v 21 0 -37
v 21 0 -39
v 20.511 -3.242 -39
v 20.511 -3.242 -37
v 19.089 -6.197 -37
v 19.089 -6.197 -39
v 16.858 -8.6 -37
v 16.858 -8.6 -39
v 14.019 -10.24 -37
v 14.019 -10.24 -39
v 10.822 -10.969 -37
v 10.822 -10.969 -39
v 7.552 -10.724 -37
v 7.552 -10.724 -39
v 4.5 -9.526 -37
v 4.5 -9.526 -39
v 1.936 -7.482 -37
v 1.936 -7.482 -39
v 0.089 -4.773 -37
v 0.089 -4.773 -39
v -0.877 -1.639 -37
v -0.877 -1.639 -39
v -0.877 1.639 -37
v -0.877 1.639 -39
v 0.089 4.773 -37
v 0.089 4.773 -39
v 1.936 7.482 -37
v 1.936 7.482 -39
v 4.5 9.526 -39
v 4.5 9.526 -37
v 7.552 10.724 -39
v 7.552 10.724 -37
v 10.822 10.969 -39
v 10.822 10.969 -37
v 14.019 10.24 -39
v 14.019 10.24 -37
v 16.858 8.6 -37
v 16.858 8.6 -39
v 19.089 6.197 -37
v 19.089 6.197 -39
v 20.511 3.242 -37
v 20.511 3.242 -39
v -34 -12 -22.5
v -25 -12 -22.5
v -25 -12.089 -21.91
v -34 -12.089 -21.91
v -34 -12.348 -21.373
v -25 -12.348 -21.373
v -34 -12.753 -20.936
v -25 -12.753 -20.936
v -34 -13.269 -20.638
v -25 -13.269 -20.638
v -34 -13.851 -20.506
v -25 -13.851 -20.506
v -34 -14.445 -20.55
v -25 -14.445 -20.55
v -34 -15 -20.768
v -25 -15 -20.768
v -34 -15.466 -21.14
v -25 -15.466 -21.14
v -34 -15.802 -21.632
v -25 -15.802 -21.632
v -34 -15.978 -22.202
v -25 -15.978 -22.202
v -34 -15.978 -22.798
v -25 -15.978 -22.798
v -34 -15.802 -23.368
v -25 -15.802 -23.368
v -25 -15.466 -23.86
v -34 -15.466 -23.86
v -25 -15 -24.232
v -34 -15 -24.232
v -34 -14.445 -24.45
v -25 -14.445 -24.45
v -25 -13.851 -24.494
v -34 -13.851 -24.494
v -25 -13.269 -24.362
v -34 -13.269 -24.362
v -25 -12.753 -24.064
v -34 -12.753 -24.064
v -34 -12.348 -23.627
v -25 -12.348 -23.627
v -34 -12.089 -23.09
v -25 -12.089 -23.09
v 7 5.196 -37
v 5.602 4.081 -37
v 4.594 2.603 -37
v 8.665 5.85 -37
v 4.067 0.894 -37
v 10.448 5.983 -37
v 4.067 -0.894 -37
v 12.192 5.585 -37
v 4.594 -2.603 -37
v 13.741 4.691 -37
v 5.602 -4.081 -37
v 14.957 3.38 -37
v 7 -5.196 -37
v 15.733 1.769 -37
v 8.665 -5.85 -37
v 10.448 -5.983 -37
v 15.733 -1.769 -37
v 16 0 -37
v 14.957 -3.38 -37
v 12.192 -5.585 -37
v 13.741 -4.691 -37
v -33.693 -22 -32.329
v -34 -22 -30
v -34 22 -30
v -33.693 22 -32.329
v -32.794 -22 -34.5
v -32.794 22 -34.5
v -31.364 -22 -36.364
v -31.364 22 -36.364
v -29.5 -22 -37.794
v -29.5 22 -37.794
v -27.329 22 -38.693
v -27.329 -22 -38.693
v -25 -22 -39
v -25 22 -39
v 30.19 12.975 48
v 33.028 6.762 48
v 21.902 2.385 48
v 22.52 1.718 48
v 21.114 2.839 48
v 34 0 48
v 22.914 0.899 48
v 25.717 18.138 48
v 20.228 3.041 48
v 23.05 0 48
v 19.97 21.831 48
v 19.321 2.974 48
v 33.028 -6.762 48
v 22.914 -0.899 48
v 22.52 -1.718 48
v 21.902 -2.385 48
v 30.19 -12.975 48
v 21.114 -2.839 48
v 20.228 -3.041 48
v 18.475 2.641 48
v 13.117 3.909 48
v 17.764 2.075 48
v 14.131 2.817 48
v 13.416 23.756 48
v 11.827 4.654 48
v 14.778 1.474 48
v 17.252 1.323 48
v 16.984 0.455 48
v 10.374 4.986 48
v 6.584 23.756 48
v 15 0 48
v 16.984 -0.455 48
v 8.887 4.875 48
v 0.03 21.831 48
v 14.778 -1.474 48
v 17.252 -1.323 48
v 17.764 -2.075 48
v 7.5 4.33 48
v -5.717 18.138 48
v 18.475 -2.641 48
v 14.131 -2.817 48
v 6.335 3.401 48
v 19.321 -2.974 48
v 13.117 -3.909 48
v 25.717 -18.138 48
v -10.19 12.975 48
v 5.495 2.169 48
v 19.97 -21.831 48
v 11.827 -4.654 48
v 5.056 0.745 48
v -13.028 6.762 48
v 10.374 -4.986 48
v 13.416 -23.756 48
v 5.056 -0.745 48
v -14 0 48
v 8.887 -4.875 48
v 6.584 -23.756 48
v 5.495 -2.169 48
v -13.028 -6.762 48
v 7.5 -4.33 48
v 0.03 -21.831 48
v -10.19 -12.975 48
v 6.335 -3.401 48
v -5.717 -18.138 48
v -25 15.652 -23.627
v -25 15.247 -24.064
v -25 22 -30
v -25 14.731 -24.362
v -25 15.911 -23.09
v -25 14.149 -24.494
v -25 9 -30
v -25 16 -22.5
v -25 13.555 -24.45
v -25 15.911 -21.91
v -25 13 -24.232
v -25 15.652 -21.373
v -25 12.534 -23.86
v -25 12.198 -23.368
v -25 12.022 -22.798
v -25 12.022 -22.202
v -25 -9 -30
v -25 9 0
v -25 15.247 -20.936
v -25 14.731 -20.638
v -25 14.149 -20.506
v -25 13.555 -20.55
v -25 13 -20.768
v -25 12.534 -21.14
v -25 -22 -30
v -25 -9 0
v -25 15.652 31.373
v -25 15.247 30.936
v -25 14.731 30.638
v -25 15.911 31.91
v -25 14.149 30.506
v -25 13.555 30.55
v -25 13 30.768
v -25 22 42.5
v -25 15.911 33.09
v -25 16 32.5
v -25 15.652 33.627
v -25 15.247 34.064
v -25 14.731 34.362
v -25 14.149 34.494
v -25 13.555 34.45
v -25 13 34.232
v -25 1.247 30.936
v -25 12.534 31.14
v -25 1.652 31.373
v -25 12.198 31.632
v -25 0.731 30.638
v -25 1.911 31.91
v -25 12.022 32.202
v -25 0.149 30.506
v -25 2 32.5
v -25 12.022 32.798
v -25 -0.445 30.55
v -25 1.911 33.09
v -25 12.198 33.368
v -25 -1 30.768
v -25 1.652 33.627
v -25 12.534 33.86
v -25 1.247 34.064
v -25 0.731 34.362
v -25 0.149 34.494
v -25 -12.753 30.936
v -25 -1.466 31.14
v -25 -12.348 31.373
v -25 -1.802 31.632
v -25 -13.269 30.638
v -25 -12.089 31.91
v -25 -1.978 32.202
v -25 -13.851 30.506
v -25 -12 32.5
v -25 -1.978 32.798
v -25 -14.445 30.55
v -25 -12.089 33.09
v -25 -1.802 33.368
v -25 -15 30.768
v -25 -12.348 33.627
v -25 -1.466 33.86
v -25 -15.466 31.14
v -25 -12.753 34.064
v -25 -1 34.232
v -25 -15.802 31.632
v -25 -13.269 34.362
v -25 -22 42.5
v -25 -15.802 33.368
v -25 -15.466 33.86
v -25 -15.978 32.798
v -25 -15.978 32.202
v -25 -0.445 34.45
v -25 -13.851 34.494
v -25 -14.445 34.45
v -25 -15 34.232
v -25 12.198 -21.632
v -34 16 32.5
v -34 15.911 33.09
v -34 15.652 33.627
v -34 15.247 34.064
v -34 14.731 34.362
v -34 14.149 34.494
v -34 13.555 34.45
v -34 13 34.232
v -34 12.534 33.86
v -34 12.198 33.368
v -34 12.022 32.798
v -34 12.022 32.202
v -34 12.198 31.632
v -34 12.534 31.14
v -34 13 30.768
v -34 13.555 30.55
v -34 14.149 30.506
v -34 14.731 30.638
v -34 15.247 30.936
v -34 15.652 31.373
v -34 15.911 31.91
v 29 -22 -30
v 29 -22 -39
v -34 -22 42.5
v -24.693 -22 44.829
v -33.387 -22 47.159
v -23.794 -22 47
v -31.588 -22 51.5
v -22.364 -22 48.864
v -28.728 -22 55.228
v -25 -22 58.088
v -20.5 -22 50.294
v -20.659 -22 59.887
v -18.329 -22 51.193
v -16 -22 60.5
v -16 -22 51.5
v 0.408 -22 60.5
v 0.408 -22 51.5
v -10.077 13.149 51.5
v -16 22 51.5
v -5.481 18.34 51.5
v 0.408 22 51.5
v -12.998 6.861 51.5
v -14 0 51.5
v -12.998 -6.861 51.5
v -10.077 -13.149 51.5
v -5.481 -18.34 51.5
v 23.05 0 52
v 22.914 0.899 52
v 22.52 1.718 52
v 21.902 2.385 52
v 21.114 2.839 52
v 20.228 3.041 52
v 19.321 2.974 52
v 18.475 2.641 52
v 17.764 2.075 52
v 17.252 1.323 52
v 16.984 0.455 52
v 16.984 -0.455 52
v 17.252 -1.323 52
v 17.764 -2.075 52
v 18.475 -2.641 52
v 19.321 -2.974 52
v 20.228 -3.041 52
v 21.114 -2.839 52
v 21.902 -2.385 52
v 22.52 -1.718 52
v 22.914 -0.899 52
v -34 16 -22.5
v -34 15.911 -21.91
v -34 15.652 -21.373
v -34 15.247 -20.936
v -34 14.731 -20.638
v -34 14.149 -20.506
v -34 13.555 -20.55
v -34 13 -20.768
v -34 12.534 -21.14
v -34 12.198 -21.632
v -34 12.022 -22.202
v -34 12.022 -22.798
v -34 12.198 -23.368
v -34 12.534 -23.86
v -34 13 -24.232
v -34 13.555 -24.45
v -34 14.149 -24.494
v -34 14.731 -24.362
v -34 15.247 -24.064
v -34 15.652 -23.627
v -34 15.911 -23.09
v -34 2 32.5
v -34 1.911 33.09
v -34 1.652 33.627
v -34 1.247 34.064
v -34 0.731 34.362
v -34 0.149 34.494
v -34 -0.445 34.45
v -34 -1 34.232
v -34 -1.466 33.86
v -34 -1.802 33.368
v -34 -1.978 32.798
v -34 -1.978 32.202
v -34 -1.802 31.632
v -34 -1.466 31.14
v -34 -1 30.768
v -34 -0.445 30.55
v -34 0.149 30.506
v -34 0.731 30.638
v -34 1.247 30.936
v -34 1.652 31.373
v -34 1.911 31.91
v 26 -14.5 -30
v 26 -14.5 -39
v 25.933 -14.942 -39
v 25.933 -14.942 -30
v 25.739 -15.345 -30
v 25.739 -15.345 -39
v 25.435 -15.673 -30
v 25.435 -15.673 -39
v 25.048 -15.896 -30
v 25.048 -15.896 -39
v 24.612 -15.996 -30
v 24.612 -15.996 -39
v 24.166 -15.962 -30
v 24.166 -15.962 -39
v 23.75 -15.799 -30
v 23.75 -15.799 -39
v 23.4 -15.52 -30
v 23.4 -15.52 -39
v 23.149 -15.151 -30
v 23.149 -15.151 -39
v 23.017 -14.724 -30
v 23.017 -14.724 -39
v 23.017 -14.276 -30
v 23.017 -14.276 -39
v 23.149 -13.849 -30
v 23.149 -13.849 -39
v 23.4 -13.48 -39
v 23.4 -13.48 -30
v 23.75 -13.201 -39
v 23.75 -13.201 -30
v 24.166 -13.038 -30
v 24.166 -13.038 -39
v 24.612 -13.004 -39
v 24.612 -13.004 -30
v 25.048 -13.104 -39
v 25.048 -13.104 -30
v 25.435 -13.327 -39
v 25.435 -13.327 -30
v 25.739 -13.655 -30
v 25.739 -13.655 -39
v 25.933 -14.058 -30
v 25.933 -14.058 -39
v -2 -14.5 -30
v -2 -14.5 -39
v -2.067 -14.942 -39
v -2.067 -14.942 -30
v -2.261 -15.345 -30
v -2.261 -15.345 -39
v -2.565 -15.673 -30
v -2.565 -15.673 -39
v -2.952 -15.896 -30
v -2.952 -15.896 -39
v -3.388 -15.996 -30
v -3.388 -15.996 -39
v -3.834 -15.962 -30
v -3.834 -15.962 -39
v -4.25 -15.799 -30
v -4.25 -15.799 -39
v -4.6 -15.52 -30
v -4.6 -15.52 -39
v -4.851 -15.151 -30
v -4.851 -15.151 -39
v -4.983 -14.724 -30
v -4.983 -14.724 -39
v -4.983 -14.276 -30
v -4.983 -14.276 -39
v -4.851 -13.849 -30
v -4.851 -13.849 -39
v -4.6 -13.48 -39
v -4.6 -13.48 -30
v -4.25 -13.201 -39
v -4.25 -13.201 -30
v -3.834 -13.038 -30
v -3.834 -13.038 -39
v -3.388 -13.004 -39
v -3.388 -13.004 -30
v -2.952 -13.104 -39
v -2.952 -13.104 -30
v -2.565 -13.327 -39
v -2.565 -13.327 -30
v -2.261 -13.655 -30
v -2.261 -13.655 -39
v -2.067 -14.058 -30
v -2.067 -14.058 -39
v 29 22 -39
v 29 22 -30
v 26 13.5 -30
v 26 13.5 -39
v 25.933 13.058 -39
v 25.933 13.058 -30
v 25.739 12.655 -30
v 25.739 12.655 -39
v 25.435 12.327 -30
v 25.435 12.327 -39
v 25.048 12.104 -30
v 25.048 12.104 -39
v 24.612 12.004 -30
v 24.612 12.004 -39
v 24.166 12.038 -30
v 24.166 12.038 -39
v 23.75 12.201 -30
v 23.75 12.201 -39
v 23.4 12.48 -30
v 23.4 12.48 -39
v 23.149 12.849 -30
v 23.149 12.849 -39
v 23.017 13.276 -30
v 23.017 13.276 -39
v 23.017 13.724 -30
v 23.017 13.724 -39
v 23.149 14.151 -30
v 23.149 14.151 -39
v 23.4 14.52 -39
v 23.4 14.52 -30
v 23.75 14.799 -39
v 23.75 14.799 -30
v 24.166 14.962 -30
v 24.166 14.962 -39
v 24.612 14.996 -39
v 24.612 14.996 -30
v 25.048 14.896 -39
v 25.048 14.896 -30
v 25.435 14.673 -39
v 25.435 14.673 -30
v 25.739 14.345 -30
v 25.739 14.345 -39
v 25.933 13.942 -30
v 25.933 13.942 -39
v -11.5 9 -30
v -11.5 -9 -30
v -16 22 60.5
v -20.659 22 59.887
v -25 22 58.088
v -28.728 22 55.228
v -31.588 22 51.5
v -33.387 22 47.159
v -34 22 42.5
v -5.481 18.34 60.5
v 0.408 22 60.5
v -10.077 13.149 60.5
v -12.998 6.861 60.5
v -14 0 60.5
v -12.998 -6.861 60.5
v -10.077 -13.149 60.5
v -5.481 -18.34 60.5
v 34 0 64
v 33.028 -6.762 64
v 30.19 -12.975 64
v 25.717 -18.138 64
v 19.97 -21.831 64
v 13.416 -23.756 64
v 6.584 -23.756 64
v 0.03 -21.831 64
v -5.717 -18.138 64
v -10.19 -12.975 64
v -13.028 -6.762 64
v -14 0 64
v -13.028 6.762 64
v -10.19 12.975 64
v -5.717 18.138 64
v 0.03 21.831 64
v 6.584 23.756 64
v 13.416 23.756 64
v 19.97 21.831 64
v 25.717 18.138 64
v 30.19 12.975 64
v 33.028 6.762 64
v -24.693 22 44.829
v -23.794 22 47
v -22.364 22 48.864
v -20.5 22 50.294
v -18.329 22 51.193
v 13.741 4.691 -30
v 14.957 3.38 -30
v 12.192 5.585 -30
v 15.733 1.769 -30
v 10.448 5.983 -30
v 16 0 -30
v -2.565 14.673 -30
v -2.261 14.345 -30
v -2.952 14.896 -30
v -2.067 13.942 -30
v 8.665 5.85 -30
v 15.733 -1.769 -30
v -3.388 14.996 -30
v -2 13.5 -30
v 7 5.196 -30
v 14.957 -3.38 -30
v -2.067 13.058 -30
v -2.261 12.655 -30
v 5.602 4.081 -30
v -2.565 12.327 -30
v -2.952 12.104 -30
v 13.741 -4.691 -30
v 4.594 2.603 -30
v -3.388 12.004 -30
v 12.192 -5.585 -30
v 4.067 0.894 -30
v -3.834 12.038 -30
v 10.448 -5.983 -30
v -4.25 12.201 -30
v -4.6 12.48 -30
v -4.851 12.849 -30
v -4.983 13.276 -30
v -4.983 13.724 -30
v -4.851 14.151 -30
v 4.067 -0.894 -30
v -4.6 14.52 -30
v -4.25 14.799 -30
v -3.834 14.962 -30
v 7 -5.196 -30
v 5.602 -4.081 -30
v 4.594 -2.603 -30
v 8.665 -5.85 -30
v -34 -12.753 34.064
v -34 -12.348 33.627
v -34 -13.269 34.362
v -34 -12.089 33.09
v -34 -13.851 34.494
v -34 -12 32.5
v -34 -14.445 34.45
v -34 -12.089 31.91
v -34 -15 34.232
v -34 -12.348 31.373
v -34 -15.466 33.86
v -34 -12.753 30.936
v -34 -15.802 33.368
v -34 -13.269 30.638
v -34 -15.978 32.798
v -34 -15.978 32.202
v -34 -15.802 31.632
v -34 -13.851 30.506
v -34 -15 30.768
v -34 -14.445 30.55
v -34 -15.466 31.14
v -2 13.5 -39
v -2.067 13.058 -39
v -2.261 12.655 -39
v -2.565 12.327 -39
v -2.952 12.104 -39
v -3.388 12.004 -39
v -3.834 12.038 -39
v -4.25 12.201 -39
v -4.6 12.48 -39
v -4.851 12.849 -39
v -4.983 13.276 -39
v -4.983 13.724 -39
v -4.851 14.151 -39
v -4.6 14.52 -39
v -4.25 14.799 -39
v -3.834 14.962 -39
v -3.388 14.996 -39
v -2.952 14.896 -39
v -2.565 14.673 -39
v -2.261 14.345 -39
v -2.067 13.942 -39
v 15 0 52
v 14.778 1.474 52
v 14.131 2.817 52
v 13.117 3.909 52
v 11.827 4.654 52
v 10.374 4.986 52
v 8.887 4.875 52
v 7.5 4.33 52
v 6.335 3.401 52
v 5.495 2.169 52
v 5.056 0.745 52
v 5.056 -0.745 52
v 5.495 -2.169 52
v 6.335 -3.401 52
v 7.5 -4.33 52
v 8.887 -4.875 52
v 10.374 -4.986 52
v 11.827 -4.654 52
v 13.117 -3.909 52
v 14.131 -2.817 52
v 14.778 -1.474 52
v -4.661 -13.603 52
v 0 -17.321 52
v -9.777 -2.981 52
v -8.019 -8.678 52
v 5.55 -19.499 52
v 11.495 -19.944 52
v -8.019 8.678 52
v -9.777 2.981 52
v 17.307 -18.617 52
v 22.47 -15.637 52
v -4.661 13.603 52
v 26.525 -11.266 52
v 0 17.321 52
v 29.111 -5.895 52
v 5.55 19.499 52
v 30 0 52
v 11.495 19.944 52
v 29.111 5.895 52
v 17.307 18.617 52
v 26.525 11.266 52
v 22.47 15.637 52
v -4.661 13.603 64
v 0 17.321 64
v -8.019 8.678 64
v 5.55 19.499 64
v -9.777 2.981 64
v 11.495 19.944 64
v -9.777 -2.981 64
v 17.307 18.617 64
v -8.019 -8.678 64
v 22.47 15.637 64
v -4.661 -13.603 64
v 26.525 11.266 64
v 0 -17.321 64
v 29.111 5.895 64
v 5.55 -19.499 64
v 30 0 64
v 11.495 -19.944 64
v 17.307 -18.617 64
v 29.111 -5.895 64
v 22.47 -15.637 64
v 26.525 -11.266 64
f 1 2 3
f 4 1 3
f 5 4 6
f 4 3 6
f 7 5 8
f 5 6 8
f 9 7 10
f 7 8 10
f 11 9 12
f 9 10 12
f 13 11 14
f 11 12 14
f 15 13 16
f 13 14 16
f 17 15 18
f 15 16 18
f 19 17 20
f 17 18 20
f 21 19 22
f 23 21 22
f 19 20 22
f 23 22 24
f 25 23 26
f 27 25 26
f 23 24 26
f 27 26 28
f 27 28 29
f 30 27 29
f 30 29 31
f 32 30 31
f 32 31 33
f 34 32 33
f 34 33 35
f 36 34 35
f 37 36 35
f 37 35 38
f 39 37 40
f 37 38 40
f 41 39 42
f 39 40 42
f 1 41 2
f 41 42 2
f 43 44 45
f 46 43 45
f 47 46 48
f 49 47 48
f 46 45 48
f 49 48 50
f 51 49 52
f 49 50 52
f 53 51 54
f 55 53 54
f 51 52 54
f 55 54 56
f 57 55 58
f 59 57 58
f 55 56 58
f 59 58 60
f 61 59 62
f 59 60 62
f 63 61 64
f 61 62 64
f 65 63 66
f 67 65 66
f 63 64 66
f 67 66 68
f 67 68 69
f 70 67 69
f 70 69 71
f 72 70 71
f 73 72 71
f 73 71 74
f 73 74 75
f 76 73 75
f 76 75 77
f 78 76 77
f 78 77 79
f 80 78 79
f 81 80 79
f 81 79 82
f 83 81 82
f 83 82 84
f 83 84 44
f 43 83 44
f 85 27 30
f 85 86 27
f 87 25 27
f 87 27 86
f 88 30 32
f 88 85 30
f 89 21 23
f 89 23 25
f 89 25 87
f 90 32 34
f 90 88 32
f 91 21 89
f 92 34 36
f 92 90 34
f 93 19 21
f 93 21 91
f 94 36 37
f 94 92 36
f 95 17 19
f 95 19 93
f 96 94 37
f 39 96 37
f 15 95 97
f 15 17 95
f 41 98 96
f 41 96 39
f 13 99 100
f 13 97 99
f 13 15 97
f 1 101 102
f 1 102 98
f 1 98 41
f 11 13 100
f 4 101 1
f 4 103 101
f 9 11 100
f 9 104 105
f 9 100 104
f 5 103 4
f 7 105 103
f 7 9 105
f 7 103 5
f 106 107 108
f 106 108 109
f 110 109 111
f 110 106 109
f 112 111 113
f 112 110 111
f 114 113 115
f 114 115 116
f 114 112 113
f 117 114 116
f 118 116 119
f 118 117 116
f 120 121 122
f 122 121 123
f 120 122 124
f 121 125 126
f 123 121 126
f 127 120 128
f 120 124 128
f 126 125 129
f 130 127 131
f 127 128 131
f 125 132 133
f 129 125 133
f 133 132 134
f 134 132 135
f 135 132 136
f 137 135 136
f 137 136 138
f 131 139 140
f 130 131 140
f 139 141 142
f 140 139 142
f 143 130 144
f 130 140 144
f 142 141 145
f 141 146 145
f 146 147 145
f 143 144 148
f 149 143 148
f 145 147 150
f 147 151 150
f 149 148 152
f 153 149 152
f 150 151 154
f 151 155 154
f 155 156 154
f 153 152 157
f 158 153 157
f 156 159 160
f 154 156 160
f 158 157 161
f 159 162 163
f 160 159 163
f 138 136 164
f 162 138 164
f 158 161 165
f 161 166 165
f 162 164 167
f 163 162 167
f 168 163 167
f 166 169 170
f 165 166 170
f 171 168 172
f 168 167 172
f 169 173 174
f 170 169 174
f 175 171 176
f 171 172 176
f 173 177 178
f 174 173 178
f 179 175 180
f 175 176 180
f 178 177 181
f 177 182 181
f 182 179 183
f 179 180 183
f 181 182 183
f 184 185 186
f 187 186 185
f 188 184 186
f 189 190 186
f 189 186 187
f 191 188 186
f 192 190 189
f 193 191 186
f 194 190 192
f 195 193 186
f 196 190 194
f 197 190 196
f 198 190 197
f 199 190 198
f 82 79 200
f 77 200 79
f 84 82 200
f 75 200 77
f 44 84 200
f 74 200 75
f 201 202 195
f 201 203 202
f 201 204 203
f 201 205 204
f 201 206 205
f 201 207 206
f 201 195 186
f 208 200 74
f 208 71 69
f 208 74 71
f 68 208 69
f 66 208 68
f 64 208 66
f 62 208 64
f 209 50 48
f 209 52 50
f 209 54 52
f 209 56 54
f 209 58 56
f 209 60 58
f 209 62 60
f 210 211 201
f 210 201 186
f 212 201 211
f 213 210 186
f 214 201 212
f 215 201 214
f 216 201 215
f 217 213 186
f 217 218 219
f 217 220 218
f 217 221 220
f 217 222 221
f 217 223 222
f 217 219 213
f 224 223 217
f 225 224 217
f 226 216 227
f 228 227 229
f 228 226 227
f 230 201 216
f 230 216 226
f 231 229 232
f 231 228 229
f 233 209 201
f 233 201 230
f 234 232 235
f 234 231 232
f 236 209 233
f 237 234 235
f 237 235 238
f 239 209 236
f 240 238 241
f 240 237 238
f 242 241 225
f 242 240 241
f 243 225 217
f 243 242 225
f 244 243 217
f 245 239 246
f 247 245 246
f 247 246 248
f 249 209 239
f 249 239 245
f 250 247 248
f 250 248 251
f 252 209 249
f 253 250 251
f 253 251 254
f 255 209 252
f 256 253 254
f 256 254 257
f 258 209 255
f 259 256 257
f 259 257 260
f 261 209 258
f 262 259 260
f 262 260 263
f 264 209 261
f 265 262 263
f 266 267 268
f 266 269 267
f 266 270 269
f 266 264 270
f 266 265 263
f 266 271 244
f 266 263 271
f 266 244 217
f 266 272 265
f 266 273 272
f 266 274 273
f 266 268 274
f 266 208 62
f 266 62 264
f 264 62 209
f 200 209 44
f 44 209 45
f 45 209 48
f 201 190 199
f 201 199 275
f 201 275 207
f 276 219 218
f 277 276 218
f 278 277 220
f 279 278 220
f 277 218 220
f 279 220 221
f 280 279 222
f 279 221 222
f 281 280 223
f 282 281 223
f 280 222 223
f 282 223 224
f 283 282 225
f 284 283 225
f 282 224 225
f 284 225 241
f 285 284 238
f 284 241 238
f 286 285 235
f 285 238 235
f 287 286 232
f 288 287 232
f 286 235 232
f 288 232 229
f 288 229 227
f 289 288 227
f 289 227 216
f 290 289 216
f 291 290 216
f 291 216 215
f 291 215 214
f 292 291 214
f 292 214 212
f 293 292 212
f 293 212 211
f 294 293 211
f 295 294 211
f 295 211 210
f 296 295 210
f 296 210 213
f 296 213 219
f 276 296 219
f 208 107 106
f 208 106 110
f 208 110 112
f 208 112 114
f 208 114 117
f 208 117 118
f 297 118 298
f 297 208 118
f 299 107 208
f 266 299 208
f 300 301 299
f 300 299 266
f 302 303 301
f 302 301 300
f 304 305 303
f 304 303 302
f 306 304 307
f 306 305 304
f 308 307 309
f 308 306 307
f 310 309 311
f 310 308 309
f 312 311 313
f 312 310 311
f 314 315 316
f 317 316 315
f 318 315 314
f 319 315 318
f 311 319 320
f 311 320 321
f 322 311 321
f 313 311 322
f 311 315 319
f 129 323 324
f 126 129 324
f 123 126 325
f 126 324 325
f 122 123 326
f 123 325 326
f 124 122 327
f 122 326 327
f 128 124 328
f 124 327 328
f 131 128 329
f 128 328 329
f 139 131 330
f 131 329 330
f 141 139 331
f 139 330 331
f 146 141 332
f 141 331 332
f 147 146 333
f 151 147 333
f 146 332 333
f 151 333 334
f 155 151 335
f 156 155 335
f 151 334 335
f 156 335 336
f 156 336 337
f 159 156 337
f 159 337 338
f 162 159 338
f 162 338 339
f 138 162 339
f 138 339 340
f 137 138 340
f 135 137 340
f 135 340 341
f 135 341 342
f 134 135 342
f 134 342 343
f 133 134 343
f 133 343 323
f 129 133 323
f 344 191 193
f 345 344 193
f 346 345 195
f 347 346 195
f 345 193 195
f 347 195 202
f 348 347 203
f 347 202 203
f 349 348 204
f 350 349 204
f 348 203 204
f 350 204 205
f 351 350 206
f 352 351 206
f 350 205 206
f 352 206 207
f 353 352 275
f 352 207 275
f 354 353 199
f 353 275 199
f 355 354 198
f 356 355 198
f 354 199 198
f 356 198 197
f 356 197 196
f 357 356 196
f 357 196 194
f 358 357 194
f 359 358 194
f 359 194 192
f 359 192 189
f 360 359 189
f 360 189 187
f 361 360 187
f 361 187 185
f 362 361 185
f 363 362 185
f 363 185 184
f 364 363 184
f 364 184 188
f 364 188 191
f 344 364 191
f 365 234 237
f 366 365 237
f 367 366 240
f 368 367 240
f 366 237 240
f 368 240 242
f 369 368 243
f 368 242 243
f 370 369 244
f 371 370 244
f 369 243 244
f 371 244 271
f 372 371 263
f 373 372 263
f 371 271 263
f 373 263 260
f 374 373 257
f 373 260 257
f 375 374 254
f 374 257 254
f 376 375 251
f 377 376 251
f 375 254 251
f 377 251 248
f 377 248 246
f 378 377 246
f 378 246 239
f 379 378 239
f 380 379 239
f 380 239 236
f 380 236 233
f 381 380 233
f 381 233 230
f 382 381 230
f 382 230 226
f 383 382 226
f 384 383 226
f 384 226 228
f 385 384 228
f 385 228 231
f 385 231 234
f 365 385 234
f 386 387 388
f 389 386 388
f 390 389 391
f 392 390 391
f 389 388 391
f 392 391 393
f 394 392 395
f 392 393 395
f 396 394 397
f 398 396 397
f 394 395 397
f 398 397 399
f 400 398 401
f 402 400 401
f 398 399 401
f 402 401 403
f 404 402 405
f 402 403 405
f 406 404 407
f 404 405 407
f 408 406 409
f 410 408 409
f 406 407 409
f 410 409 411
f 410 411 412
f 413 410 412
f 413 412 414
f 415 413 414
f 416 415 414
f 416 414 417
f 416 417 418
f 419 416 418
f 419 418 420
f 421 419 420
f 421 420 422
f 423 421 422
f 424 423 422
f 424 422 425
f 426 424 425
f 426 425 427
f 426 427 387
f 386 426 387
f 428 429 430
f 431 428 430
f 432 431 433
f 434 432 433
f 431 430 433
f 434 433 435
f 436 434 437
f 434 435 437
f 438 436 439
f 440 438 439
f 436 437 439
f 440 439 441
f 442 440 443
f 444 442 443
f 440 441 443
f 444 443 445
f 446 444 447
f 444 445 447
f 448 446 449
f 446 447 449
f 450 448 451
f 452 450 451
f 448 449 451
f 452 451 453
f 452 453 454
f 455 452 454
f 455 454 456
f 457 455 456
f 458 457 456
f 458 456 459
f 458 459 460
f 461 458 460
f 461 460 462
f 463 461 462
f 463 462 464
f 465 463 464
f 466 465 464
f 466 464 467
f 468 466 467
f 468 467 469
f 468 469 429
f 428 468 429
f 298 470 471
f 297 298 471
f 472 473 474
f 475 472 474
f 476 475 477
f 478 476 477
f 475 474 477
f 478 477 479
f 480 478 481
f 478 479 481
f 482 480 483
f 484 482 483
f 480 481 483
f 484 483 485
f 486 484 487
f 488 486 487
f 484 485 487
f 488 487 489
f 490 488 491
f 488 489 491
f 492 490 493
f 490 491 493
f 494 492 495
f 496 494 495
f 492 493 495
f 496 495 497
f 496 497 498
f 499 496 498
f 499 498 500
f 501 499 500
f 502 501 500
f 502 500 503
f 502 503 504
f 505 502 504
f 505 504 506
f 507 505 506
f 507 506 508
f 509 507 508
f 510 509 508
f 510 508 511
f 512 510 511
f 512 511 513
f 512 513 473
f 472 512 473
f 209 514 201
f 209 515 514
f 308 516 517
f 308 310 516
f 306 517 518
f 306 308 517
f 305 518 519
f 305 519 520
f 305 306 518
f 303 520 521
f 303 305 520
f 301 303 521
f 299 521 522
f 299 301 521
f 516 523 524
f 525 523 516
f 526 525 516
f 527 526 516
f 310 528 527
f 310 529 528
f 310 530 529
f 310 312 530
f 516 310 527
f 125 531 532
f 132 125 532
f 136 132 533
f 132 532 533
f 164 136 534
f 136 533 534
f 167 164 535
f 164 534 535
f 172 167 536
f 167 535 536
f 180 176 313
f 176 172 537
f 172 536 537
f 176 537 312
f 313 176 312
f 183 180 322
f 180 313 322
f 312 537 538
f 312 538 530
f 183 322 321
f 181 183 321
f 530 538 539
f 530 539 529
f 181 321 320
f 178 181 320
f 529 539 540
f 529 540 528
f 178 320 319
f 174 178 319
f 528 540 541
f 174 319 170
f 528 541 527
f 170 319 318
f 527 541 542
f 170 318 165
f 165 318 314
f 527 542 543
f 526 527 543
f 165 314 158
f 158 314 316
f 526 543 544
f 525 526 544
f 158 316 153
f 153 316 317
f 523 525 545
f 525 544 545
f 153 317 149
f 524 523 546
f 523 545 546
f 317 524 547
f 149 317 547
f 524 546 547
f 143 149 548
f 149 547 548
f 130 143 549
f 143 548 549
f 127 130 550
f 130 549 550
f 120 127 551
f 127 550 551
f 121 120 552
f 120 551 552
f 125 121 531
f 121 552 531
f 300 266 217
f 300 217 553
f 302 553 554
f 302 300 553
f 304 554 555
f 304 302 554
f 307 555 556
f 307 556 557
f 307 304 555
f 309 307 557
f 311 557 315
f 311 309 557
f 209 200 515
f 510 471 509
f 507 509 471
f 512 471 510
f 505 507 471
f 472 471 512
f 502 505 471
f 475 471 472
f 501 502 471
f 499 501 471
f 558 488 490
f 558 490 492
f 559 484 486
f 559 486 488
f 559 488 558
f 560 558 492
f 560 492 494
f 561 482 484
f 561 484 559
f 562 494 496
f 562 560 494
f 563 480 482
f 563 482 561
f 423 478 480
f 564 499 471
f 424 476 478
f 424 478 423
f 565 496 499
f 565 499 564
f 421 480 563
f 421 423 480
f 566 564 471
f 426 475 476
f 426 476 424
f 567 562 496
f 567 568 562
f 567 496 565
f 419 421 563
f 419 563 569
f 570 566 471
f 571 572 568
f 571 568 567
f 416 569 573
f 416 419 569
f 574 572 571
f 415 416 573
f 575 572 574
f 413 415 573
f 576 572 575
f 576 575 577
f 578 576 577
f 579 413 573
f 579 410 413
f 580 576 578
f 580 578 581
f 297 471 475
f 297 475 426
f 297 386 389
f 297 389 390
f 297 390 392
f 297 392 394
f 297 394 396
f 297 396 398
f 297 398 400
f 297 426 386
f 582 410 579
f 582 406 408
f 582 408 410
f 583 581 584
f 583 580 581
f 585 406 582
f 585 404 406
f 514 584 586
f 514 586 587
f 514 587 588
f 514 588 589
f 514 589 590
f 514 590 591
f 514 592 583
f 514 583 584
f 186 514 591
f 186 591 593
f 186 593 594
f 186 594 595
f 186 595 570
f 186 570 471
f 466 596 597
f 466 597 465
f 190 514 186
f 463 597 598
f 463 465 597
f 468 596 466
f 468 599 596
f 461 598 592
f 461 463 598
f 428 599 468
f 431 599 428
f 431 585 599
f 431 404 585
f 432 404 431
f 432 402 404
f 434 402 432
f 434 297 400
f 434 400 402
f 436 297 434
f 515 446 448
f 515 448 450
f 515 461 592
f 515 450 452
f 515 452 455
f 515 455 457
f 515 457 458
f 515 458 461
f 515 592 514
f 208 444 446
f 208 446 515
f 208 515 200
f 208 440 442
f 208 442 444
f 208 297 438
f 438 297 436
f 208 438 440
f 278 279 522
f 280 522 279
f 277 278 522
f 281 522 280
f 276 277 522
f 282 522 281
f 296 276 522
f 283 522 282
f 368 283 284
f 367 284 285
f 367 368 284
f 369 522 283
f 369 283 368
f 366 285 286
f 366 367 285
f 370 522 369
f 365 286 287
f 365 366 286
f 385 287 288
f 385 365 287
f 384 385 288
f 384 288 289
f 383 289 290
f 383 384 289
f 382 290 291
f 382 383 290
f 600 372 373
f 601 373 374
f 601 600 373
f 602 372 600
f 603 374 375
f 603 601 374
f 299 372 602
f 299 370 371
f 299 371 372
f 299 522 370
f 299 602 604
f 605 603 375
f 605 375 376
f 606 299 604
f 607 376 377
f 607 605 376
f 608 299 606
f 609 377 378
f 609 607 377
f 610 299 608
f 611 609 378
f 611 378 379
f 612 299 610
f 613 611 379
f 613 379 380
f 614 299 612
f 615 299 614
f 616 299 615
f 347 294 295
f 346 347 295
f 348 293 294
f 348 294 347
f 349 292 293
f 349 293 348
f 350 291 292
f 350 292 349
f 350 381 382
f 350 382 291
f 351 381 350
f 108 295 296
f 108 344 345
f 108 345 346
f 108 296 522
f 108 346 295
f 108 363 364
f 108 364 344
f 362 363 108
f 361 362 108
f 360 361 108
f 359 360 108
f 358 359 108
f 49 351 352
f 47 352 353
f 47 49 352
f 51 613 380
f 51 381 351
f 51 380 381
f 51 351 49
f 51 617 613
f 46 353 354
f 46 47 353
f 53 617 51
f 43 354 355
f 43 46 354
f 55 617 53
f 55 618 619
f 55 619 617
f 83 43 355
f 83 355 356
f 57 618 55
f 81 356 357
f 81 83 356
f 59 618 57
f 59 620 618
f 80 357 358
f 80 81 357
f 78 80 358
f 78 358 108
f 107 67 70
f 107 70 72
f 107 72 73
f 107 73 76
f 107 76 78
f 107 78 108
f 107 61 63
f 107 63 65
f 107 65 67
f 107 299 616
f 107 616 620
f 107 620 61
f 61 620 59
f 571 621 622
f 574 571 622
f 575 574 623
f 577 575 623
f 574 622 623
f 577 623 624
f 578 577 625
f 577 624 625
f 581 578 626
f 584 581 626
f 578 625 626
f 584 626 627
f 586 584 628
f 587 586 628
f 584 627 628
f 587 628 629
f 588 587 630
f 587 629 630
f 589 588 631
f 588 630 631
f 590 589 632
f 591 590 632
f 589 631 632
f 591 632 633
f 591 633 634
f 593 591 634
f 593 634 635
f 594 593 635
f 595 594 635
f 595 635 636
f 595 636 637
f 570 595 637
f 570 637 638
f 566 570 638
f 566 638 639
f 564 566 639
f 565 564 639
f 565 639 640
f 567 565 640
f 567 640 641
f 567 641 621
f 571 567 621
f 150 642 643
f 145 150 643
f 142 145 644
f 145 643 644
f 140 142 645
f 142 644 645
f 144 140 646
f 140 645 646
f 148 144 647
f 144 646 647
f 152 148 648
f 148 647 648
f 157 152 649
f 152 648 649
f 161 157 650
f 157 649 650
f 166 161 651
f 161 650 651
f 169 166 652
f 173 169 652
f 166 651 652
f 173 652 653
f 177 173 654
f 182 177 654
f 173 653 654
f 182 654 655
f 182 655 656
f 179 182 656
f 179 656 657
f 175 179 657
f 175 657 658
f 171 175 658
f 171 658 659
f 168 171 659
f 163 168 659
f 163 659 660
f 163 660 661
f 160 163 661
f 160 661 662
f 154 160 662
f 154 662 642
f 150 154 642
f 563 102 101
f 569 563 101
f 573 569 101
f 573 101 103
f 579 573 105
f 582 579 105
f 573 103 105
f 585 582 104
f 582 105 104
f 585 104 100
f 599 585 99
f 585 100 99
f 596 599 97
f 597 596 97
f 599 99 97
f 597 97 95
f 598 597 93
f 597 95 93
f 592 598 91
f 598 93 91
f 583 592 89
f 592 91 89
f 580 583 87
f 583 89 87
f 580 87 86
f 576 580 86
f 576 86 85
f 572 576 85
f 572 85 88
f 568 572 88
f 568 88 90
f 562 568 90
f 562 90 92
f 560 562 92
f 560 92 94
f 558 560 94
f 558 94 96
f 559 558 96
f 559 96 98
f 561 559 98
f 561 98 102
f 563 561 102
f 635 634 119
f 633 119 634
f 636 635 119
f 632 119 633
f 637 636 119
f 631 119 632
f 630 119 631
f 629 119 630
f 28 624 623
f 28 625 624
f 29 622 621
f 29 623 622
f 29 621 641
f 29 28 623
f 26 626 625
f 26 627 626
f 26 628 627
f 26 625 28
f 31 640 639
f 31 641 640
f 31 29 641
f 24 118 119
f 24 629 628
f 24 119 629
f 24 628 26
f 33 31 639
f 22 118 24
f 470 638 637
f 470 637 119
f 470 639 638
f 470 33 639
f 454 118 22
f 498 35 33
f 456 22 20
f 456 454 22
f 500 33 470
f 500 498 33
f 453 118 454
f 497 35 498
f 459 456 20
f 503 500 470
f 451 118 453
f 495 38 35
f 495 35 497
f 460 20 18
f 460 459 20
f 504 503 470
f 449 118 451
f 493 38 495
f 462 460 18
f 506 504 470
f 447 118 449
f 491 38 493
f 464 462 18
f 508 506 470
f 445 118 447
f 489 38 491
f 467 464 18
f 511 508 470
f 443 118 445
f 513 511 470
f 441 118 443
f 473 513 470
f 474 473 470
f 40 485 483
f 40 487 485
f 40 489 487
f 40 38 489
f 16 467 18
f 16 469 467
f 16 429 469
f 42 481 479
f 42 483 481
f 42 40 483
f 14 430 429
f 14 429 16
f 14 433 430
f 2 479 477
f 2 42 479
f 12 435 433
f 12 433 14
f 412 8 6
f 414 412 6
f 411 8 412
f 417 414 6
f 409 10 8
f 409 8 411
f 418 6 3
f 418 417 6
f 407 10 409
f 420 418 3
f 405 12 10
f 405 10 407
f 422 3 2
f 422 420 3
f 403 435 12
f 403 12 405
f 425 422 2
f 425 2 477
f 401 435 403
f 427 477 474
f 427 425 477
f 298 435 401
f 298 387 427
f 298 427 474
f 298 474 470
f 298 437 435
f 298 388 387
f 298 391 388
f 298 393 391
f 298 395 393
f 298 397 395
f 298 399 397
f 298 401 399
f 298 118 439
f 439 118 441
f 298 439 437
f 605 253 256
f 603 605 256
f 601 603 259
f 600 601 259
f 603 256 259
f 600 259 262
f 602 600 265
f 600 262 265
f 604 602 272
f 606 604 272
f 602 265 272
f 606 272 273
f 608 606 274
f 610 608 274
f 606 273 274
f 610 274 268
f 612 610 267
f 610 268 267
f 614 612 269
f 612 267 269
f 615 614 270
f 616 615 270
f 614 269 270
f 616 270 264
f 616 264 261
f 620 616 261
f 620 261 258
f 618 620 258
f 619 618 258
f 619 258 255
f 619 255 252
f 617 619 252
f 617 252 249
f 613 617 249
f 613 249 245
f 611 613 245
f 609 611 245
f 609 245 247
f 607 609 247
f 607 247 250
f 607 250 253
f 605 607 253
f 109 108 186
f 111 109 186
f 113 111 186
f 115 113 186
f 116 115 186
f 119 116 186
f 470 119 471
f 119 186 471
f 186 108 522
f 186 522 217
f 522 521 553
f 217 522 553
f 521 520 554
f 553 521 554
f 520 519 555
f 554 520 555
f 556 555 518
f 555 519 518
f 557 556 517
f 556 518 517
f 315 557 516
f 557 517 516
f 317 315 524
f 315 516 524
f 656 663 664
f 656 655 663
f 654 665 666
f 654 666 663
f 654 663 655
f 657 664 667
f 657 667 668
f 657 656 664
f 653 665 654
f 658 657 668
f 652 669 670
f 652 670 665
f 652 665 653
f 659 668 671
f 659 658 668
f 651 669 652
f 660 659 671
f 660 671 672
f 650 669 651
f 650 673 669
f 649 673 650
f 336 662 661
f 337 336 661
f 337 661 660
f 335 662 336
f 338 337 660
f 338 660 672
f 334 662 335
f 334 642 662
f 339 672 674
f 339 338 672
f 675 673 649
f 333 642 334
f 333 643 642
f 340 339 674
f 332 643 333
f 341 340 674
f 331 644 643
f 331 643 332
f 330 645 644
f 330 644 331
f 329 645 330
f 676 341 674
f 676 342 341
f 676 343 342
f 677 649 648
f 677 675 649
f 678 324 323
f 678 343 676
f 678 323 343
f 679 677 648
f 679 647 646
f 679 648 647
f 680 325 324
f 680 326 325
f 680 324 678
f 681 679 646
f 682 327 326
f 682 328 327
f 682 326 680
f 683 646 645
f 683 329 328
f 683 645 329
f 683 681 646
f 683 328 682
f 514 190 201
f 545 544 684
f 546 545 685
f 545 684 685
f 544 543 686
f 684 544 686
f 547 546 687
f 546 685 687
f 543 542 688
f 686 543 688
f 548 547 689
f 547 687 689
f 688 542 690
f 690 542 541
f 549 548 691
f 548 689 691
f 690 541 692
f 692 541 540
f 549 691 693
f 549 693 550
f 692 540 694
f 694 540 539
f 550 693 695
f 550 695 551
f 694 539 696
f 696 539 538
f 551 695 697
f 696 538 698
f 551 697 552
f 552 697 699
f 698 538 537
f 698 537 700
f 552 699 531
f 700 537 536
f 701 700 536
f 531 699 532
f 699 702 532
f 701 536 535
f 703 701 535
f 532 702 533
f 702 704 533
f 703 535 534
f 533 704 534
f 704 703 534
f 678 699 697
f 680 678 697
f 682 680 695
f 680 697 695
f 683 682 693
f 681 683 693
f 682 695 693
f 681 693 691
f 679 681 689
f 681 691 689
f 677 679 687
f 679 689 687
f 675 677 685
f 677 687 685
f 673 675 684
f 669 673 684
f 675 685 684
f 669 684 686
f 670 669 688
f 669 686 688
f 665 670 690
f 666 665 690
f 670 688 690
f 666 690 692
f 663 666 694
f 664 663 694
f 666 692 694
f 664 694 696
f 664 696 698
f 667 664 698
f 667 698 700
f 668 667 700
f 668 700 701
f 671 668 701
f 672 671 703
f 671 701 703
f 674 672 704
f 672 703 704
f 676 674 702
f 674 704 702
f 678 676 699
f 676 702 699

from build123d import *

# Parameters (mm, degrees)
F0_W      = 2
F0_H      = 9
F0_W_2    = 24
F1_DEPTH  = 22
F3_R      = 20
F4_DEPTH  = 12
F5_R      = 5
F5_R_2    = 3.05
F6_DEPTH  = 50
F7_R      = 2
F8_DEPTH  = 9.001
F9_R      = 11
F10_DEPTH = 2
F11_R     = 1.5
F12_DEPTH = 20
F13_R     = 6
F14_DEPTH = 25
F15_DEPTH = 9


with BuildPart() as f1:
    # F0 (on Front) → F1 (new body, symmetric)
    with BuildSketch(Plane.XZ):
        with BuildLine():
            Line((-16, 51.5), (-16, 60.5))
            ThreePointArc((-16, 60.5), (-28.7279220614, 55.2279220614), (-34, 42.5))
            Line((-34, 42.5), (-34, -30))
            ThreePointArc((-34, -30), (-31.3639610307, -36.3639610307), (-25, -39))
            Line((-25, -39), (-25, -30))
            Line((-25, -30), (-25, 0))
            Line((-25, 0), (-25, 42.5))
            ThreePointArc((-25, 42.5), (-22.3639610307, 48.8639610307), (-16, 51.5))
        make_face()
        with Locations((-15, 56)):
            Rectangle(F0_W, F0_H)
        with Locations((-2, 56)):
            Rectangle(F0_W_2, F0_H)
        Polygon((-25, -30), (-25, -39), (29, -39), (29, -30), (-11.5, -30), align=None)
    extrude(amount=F1_DEPTH, both=True)

    # F0 (on Front) → F2 (revolve)
    with BuildSketch(Plane.XZ):
        Polygon((34, 64), (10, 64), (10, 60.5), (10, 51.5), (10, 48), (34, 48), align=None)
    revolve(axis=Axis((10, 0, 55.4929765165), (0, 0, -1)))

    # F3 (on face) → F4 (cut)
    with BuildSketch(Plane.XY.offset(64)):
        with Locations((10, 0)):
            Circle(F3_R)
    extrude(amount=-F4_DEPTH, mode=Mode.SUBTRACT)

    # F5 (on face) → F6 (cut)
    with BuildSketch(Plane.XY.offset(52)):
        with Locations((10, 0)):
            Circle(F5_R)
        with Locations((20, 0)):
            Circle(F5_R_2)
    extrude(amount=-F6_DEPTH, mode=Mode.SUBTRACT)

    # F7 (on face) → F8 (cut, through all)
    with BuildSketch(Plane.YZ.offset(-25)):
        with Locations((14, -22.5)):
            Circle(F7_R)
        with Locations((14, 32.5)):
            Circle(F7_R)
        with Locations((0, 32.5)):
            Circle(F7_R)
        with Locations((-14, -22.5)):
            Circle(F7_R)
        with Locations((-14, 32.5)):
            Circle(F7_R)
    extrude(amount=-F8_DEPTH, mode=Mode.SUBTRACT)

    # F9 (on face) → F10 (cut)
    with BuildSketch(Plane(origin=(0, 0, -39), x_dir=(1, 0, 0), z_dir=(0, 0, -1))):
        with Locations((10, 0)):
            Circle(F9_R)
    extrude(amount=-F10_DEPTH, mode=Mode.SUBTRACT)

    # F11 (on face) → F12 (cut)
    with BuildSketch(Plane(origin=(0, 0, -39), x_dir=(1, 0, 0), z_dir=(0, 0, -1))):
        with Locations((-3.5, -13.5)):
            Circle(F11_R)
        with Locations((-3.5, 14.5)):
            Circle(F11_R)
        with Locations((24.5, -13.5)):
            Circle(F11_R)
        with Locations((24.5, 14.5)):
            Circle(F11_R)
        with Locations((52.5, -13.5)):
            Circle(F11_R)
        with Locations((52.5, 14.5)):
            Circle(F11_R)
    extrude(amount=-F12_DEPTH, mode=Mode.SUBTRACT)

    # F13 (on face) → F14 (cut)
    with BuildSketch(Plane(origin=(0, 0, -39), x_dir=(1, 0, 0), z_dir=(0, 0, -1))):
        with Locations((10, 0)):
            Circle(F13_R)
    extrude(amount=-F14_DEPTH, mode=Mode.SUBTRACT)

    # F0 (on Front) → F15 (join, symmetric)
    with BuildSketch(Plane.XZ):
        Polygon((-11.5, -30), (-25, 0), (-25, -30), align=None)
    extrude(amount=F15_DEPTH, both=True)


solid = f1.part
